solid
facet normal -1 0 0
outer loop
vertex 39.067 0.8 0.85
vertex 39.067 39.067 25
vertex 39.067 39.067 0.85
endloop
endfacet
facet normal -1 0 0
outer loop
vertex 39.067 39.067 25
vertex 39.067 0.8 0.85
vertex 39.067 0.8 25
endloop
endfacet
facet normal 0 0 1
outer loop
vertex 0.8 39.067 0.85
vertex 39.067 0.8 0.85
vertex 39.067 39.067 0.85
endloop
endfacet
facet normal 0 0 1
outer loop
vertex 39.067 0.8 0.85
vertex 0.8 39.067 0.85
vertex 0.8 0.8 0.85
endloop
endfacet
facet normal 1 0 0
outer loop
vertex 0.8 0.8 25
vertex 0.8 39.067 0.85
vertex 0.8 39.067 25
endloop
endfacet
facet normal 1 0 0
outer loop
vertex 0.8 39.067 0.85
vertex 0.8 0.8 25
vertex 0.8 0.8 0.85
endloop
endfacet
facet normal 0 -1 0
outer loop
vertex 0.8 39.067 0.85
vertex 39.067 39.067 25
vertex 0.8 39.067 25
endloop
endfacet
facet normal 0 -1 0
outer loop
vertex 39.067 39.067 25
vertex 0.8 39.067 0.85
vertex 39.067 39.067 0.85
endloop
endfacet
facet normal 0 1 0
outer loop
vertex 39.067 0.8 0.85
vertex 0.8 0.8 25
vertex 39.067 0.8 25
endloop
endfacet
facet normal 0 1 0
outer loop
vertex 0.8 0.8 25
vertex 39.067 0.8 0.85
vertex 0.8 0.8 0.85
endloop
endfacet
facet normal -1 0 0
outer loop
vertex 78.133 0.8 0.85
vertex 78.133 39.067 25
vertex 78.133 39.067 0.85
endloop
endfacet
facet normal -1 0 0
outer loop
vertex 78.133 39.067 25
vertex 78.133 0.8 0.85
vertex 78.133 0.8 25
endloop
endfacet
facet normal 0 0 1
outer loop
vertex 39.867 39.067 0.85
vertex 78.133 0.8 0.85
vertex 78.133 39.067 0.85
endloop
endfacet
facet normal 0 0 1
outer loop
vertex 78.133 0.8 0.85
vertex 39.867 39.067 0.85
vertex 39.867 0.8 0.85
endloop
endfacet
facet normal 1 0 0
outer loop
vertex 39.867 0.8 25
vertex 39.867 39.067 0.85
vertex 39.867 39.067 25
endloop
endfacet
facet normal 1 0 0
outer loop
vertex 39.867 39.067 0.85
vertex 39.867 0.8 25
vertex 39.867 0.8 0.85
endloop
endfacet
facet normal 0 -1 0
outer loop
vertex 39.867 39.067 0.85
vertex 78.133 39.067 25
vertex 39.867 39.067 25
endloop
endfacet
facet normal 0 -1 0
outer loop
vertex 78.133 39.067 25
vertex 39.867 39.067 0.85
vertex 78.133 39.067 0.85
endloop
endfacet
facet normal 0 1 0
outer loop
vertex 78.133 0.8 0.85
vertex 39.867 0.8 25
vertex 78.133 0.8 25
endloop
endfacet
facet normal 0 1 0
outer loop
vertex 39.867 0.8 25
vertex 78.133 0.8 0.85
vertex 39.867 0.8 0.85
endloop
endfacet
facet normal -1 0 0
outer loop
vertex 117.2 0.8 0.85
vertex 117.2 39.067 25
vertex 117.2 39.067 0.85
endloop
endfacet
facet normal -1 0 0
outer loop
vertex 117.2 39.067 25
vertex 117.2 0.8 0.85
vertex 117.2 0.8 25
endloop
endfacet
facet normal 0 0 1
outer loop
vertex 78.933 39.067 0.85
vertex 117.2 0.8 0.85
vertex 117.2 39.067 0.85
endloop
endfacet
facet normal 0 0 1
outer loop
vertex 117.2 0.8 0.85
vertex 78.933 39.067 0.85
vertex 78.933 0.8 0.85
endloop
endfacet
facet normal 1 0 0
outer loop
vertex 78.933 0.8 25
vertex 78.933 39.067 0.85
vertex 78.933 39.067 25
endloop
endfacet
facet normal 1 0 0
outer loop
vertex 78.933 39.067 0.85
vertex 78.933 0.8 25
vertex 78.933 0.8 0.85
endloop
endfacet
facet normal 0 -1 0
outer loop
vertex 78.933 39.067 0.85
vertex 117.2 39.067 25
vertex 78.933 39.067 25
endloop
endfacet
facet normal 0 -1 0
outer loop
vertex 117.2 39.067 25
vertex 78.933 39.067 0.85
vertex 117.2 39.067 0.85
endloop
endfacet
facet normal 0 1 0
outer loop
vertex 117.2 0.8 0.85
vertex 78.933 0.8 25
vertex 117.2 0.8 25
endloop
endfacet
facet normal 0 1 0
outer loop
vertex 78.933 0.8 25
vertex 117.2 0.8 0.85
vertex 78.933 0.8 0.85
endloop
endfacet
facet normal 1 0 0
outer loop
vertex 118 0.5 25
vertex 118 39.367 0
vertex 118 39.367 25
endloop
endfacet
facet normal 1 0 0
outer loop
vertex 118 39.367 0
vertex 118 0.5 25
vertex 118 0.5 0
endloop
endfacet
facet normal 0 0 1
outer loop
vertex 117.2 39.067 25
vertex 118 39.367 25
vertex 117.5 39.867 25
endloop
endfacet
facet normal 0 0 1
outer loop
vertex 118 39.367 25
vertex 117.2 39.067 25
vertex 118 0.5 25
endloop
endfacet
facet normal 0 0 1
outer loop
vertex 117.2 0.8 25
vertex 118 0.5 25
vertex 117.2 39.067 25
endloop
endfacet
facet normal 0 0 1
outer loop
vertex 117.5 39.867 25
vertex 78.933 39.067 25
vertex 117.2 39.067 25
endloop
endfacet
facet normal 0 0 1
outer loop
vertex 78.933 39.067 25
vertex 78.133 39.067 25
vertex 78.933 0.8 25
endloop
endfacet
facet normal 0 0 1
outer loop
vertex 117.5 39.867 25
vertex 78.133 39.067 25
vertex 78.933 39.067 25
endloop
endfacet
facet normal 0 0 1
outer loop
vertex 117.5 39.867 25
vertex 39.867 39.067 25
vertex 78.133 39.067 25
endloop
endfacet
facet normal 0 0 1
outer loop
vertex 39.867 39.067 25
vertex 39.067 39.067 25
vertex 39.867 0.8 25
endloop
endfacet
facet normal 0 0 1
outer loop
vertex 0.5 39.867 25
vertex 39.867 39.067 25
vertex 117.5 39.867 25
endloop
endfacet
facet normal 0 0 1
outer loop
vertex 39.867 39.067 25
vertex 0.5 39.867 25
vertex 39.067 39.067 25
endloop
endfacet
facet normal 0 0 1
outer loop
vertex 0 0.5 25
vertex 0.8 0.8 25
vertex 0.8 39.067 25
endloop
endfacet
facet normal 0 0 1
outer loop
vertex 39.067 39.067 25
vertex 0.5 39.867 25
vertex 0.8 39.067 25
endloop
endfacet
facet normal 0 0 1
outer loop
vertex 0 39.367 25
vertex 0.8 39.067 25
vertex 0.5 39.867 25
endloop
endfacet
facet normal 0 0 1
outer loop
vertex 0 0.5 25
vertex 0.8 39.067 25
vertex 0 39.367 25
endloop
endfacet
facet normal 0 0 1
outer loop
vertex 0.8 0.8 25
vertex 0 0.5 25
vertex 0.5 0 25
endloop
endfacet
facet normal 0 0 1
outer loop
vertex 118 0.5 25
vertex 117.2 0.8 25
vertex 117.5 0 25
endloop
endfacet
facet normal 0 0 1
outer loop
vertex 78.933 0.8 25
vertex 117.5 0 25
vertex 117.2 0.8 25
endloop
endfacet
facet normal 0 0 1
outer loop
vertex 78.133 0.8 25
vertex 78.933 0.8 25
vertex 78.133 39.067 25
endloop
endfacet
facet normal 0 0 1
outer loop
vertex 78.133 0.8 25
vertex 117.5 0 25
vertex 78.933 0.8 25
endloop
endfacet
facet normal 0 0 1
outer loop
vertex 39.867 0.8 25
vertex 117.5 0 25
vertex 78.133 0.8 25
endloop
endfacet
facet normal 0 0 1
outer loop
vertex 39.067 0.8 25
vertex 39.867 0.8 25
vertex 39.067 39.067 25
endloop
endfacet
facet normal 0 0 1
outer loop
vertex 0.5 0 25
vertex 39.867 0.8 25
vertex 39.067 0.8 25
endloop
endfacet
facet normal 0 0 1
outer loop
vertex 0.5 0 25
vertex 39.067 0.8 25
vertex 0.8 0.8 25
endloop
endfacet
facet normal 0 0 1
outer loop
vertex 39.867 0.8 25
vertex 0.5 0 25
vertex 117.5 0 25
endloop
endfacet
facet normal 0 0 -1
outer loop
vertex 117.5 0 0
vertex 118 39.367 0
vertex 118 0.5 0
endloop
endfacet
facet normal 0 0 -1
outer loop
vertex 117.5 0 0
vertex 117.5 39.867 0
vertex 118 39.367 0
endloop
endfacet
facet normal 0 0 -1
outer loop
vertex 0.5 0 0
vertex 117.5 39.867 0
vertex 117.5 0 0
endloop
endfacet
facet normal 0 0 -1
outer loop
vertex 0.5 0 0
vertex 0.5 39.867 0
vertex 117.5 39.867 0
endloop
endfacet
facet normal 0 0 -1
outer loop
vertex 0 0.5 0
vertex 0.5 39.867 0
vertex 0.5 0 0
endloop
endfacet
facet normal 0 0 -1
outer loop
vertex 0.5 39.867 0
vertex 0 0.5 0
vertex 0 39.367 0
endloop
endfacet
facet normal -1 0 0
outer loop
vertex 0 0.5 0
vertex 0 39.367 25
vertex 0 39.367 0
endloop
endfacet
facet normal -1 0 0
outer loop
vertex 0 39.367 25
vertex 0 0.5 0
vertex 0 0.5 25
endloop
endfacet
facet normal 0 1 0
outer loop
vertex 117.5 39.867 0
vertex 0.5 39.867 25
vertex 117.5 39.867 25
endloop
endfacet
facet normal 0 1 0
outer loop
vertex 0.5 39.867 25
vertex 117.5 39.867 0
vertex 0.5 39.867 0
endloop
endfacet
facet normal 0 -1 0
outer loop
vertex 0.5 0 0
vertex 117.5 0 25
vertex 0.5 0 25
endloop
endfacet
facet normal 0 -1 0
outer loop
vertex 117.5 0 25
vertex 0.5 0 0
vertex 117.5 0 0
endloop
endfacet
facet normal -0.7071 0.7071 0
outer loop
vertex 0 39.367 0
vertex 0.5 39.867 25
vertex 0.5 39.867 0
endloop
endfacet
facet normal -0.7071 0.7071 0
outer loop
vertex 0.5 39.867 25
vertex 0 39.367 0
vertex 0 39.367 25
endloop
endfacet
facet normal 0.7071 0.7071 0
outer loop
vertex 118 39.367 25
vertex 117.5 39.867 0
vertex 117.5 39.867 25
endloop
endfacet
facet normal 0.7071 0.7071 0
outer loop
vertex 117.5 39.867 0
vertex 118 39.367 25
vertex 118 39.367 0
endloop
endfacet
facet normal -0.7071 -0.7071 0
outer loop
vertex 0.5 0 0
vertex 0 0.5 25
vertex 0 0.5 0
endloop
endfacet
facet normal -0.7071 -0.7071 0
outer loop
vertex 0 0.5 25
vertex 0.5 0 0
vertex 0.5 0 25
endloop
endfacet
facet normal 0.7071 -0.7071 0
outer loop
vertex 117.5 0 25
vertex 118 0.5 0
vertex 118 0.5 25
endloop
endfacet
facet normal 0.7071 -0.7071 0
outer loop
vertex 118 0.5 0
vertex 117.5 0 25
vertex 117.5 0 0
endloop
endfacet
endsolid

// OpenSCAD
// core vars
total_w=118; //mm
box_p_row=3; //amount of boxes per ro
box_wall_th=0.8; // mm width of the boxes wall
box_wall_h=25; //mm height of outer box walls
box_bot_th=0.8; // mm thickness of bottom 
smidg=0.05;
corner_ofs=0.25;

//calcs
walls_p_row=box_p_row+1;
box_wall_total_th=box_wall_th*walls_p_row;
total_inner_w=total_w-box_wall_total_th;
box_iw=total_inner_w/box_p_row;
box_ow=box_iw+box_wall_th*2;
box_h=box_ow;
box_wall_ih=box_wall_h-box_bot_th;
box_ih=box_h-box_wall_th*2;


echo("<b>aaa</b>");
echo("total width",total_w);
echo("walls per row", walls_p_row);
echo("total inner width(boxes)",total_inner_w);
echo("<b>aaa</b>");

difference(){
	makeboxes();

	cutcorners();
}

module makeboxes(){
difference(){
   cube([total_w,box_h,box_wall_h]);  
	for(c=[0:box_p_row-1])
	{   
   	translate([c*(box_ow-box_wall_th)+box_wall_th,box_wall_th,box_bot_th+smidg])
		    cube([box_iw,box_ih,box_wall_ih]);	

	}
	
}
}
module cutcorners(){
   boxa=2;
   boxd=boxa*sqrt(2);
 
  	//left top
	translate([-boxd/4+corner_ofs,box_h+boxd/4-corner_ofs,box_wall_h/2])
		   rotate([0,0,45])
		   	cube([boxa,boxa,box_wall_h+1],center=true);

  	//right top
	translate([total_w+boxd/4-corner_ofs,box_h+boxd/4-corner_ofs,box_wall_h/2])
		   rotate([0,0,45])
		   	cube([boxa,boxa,box_wall_h+1],center=true);

  //left bottom
   translate([-boxd/4+corner_ofs,-boxd/4+corner_ofs,box_wall_h/2])
		 rotate([0,0,45])
			cube([boxa,boxa,box_wall_h+1],center=true);

   //right bottom
   translate([total_w+boxd/4-corner_ofs,-boxd/4+corner_ofs,box_wall_h/2])
		   rotate([0,0,45])
		   	cube([boxa,boxa,box_wall_h+1],center=true);

}
